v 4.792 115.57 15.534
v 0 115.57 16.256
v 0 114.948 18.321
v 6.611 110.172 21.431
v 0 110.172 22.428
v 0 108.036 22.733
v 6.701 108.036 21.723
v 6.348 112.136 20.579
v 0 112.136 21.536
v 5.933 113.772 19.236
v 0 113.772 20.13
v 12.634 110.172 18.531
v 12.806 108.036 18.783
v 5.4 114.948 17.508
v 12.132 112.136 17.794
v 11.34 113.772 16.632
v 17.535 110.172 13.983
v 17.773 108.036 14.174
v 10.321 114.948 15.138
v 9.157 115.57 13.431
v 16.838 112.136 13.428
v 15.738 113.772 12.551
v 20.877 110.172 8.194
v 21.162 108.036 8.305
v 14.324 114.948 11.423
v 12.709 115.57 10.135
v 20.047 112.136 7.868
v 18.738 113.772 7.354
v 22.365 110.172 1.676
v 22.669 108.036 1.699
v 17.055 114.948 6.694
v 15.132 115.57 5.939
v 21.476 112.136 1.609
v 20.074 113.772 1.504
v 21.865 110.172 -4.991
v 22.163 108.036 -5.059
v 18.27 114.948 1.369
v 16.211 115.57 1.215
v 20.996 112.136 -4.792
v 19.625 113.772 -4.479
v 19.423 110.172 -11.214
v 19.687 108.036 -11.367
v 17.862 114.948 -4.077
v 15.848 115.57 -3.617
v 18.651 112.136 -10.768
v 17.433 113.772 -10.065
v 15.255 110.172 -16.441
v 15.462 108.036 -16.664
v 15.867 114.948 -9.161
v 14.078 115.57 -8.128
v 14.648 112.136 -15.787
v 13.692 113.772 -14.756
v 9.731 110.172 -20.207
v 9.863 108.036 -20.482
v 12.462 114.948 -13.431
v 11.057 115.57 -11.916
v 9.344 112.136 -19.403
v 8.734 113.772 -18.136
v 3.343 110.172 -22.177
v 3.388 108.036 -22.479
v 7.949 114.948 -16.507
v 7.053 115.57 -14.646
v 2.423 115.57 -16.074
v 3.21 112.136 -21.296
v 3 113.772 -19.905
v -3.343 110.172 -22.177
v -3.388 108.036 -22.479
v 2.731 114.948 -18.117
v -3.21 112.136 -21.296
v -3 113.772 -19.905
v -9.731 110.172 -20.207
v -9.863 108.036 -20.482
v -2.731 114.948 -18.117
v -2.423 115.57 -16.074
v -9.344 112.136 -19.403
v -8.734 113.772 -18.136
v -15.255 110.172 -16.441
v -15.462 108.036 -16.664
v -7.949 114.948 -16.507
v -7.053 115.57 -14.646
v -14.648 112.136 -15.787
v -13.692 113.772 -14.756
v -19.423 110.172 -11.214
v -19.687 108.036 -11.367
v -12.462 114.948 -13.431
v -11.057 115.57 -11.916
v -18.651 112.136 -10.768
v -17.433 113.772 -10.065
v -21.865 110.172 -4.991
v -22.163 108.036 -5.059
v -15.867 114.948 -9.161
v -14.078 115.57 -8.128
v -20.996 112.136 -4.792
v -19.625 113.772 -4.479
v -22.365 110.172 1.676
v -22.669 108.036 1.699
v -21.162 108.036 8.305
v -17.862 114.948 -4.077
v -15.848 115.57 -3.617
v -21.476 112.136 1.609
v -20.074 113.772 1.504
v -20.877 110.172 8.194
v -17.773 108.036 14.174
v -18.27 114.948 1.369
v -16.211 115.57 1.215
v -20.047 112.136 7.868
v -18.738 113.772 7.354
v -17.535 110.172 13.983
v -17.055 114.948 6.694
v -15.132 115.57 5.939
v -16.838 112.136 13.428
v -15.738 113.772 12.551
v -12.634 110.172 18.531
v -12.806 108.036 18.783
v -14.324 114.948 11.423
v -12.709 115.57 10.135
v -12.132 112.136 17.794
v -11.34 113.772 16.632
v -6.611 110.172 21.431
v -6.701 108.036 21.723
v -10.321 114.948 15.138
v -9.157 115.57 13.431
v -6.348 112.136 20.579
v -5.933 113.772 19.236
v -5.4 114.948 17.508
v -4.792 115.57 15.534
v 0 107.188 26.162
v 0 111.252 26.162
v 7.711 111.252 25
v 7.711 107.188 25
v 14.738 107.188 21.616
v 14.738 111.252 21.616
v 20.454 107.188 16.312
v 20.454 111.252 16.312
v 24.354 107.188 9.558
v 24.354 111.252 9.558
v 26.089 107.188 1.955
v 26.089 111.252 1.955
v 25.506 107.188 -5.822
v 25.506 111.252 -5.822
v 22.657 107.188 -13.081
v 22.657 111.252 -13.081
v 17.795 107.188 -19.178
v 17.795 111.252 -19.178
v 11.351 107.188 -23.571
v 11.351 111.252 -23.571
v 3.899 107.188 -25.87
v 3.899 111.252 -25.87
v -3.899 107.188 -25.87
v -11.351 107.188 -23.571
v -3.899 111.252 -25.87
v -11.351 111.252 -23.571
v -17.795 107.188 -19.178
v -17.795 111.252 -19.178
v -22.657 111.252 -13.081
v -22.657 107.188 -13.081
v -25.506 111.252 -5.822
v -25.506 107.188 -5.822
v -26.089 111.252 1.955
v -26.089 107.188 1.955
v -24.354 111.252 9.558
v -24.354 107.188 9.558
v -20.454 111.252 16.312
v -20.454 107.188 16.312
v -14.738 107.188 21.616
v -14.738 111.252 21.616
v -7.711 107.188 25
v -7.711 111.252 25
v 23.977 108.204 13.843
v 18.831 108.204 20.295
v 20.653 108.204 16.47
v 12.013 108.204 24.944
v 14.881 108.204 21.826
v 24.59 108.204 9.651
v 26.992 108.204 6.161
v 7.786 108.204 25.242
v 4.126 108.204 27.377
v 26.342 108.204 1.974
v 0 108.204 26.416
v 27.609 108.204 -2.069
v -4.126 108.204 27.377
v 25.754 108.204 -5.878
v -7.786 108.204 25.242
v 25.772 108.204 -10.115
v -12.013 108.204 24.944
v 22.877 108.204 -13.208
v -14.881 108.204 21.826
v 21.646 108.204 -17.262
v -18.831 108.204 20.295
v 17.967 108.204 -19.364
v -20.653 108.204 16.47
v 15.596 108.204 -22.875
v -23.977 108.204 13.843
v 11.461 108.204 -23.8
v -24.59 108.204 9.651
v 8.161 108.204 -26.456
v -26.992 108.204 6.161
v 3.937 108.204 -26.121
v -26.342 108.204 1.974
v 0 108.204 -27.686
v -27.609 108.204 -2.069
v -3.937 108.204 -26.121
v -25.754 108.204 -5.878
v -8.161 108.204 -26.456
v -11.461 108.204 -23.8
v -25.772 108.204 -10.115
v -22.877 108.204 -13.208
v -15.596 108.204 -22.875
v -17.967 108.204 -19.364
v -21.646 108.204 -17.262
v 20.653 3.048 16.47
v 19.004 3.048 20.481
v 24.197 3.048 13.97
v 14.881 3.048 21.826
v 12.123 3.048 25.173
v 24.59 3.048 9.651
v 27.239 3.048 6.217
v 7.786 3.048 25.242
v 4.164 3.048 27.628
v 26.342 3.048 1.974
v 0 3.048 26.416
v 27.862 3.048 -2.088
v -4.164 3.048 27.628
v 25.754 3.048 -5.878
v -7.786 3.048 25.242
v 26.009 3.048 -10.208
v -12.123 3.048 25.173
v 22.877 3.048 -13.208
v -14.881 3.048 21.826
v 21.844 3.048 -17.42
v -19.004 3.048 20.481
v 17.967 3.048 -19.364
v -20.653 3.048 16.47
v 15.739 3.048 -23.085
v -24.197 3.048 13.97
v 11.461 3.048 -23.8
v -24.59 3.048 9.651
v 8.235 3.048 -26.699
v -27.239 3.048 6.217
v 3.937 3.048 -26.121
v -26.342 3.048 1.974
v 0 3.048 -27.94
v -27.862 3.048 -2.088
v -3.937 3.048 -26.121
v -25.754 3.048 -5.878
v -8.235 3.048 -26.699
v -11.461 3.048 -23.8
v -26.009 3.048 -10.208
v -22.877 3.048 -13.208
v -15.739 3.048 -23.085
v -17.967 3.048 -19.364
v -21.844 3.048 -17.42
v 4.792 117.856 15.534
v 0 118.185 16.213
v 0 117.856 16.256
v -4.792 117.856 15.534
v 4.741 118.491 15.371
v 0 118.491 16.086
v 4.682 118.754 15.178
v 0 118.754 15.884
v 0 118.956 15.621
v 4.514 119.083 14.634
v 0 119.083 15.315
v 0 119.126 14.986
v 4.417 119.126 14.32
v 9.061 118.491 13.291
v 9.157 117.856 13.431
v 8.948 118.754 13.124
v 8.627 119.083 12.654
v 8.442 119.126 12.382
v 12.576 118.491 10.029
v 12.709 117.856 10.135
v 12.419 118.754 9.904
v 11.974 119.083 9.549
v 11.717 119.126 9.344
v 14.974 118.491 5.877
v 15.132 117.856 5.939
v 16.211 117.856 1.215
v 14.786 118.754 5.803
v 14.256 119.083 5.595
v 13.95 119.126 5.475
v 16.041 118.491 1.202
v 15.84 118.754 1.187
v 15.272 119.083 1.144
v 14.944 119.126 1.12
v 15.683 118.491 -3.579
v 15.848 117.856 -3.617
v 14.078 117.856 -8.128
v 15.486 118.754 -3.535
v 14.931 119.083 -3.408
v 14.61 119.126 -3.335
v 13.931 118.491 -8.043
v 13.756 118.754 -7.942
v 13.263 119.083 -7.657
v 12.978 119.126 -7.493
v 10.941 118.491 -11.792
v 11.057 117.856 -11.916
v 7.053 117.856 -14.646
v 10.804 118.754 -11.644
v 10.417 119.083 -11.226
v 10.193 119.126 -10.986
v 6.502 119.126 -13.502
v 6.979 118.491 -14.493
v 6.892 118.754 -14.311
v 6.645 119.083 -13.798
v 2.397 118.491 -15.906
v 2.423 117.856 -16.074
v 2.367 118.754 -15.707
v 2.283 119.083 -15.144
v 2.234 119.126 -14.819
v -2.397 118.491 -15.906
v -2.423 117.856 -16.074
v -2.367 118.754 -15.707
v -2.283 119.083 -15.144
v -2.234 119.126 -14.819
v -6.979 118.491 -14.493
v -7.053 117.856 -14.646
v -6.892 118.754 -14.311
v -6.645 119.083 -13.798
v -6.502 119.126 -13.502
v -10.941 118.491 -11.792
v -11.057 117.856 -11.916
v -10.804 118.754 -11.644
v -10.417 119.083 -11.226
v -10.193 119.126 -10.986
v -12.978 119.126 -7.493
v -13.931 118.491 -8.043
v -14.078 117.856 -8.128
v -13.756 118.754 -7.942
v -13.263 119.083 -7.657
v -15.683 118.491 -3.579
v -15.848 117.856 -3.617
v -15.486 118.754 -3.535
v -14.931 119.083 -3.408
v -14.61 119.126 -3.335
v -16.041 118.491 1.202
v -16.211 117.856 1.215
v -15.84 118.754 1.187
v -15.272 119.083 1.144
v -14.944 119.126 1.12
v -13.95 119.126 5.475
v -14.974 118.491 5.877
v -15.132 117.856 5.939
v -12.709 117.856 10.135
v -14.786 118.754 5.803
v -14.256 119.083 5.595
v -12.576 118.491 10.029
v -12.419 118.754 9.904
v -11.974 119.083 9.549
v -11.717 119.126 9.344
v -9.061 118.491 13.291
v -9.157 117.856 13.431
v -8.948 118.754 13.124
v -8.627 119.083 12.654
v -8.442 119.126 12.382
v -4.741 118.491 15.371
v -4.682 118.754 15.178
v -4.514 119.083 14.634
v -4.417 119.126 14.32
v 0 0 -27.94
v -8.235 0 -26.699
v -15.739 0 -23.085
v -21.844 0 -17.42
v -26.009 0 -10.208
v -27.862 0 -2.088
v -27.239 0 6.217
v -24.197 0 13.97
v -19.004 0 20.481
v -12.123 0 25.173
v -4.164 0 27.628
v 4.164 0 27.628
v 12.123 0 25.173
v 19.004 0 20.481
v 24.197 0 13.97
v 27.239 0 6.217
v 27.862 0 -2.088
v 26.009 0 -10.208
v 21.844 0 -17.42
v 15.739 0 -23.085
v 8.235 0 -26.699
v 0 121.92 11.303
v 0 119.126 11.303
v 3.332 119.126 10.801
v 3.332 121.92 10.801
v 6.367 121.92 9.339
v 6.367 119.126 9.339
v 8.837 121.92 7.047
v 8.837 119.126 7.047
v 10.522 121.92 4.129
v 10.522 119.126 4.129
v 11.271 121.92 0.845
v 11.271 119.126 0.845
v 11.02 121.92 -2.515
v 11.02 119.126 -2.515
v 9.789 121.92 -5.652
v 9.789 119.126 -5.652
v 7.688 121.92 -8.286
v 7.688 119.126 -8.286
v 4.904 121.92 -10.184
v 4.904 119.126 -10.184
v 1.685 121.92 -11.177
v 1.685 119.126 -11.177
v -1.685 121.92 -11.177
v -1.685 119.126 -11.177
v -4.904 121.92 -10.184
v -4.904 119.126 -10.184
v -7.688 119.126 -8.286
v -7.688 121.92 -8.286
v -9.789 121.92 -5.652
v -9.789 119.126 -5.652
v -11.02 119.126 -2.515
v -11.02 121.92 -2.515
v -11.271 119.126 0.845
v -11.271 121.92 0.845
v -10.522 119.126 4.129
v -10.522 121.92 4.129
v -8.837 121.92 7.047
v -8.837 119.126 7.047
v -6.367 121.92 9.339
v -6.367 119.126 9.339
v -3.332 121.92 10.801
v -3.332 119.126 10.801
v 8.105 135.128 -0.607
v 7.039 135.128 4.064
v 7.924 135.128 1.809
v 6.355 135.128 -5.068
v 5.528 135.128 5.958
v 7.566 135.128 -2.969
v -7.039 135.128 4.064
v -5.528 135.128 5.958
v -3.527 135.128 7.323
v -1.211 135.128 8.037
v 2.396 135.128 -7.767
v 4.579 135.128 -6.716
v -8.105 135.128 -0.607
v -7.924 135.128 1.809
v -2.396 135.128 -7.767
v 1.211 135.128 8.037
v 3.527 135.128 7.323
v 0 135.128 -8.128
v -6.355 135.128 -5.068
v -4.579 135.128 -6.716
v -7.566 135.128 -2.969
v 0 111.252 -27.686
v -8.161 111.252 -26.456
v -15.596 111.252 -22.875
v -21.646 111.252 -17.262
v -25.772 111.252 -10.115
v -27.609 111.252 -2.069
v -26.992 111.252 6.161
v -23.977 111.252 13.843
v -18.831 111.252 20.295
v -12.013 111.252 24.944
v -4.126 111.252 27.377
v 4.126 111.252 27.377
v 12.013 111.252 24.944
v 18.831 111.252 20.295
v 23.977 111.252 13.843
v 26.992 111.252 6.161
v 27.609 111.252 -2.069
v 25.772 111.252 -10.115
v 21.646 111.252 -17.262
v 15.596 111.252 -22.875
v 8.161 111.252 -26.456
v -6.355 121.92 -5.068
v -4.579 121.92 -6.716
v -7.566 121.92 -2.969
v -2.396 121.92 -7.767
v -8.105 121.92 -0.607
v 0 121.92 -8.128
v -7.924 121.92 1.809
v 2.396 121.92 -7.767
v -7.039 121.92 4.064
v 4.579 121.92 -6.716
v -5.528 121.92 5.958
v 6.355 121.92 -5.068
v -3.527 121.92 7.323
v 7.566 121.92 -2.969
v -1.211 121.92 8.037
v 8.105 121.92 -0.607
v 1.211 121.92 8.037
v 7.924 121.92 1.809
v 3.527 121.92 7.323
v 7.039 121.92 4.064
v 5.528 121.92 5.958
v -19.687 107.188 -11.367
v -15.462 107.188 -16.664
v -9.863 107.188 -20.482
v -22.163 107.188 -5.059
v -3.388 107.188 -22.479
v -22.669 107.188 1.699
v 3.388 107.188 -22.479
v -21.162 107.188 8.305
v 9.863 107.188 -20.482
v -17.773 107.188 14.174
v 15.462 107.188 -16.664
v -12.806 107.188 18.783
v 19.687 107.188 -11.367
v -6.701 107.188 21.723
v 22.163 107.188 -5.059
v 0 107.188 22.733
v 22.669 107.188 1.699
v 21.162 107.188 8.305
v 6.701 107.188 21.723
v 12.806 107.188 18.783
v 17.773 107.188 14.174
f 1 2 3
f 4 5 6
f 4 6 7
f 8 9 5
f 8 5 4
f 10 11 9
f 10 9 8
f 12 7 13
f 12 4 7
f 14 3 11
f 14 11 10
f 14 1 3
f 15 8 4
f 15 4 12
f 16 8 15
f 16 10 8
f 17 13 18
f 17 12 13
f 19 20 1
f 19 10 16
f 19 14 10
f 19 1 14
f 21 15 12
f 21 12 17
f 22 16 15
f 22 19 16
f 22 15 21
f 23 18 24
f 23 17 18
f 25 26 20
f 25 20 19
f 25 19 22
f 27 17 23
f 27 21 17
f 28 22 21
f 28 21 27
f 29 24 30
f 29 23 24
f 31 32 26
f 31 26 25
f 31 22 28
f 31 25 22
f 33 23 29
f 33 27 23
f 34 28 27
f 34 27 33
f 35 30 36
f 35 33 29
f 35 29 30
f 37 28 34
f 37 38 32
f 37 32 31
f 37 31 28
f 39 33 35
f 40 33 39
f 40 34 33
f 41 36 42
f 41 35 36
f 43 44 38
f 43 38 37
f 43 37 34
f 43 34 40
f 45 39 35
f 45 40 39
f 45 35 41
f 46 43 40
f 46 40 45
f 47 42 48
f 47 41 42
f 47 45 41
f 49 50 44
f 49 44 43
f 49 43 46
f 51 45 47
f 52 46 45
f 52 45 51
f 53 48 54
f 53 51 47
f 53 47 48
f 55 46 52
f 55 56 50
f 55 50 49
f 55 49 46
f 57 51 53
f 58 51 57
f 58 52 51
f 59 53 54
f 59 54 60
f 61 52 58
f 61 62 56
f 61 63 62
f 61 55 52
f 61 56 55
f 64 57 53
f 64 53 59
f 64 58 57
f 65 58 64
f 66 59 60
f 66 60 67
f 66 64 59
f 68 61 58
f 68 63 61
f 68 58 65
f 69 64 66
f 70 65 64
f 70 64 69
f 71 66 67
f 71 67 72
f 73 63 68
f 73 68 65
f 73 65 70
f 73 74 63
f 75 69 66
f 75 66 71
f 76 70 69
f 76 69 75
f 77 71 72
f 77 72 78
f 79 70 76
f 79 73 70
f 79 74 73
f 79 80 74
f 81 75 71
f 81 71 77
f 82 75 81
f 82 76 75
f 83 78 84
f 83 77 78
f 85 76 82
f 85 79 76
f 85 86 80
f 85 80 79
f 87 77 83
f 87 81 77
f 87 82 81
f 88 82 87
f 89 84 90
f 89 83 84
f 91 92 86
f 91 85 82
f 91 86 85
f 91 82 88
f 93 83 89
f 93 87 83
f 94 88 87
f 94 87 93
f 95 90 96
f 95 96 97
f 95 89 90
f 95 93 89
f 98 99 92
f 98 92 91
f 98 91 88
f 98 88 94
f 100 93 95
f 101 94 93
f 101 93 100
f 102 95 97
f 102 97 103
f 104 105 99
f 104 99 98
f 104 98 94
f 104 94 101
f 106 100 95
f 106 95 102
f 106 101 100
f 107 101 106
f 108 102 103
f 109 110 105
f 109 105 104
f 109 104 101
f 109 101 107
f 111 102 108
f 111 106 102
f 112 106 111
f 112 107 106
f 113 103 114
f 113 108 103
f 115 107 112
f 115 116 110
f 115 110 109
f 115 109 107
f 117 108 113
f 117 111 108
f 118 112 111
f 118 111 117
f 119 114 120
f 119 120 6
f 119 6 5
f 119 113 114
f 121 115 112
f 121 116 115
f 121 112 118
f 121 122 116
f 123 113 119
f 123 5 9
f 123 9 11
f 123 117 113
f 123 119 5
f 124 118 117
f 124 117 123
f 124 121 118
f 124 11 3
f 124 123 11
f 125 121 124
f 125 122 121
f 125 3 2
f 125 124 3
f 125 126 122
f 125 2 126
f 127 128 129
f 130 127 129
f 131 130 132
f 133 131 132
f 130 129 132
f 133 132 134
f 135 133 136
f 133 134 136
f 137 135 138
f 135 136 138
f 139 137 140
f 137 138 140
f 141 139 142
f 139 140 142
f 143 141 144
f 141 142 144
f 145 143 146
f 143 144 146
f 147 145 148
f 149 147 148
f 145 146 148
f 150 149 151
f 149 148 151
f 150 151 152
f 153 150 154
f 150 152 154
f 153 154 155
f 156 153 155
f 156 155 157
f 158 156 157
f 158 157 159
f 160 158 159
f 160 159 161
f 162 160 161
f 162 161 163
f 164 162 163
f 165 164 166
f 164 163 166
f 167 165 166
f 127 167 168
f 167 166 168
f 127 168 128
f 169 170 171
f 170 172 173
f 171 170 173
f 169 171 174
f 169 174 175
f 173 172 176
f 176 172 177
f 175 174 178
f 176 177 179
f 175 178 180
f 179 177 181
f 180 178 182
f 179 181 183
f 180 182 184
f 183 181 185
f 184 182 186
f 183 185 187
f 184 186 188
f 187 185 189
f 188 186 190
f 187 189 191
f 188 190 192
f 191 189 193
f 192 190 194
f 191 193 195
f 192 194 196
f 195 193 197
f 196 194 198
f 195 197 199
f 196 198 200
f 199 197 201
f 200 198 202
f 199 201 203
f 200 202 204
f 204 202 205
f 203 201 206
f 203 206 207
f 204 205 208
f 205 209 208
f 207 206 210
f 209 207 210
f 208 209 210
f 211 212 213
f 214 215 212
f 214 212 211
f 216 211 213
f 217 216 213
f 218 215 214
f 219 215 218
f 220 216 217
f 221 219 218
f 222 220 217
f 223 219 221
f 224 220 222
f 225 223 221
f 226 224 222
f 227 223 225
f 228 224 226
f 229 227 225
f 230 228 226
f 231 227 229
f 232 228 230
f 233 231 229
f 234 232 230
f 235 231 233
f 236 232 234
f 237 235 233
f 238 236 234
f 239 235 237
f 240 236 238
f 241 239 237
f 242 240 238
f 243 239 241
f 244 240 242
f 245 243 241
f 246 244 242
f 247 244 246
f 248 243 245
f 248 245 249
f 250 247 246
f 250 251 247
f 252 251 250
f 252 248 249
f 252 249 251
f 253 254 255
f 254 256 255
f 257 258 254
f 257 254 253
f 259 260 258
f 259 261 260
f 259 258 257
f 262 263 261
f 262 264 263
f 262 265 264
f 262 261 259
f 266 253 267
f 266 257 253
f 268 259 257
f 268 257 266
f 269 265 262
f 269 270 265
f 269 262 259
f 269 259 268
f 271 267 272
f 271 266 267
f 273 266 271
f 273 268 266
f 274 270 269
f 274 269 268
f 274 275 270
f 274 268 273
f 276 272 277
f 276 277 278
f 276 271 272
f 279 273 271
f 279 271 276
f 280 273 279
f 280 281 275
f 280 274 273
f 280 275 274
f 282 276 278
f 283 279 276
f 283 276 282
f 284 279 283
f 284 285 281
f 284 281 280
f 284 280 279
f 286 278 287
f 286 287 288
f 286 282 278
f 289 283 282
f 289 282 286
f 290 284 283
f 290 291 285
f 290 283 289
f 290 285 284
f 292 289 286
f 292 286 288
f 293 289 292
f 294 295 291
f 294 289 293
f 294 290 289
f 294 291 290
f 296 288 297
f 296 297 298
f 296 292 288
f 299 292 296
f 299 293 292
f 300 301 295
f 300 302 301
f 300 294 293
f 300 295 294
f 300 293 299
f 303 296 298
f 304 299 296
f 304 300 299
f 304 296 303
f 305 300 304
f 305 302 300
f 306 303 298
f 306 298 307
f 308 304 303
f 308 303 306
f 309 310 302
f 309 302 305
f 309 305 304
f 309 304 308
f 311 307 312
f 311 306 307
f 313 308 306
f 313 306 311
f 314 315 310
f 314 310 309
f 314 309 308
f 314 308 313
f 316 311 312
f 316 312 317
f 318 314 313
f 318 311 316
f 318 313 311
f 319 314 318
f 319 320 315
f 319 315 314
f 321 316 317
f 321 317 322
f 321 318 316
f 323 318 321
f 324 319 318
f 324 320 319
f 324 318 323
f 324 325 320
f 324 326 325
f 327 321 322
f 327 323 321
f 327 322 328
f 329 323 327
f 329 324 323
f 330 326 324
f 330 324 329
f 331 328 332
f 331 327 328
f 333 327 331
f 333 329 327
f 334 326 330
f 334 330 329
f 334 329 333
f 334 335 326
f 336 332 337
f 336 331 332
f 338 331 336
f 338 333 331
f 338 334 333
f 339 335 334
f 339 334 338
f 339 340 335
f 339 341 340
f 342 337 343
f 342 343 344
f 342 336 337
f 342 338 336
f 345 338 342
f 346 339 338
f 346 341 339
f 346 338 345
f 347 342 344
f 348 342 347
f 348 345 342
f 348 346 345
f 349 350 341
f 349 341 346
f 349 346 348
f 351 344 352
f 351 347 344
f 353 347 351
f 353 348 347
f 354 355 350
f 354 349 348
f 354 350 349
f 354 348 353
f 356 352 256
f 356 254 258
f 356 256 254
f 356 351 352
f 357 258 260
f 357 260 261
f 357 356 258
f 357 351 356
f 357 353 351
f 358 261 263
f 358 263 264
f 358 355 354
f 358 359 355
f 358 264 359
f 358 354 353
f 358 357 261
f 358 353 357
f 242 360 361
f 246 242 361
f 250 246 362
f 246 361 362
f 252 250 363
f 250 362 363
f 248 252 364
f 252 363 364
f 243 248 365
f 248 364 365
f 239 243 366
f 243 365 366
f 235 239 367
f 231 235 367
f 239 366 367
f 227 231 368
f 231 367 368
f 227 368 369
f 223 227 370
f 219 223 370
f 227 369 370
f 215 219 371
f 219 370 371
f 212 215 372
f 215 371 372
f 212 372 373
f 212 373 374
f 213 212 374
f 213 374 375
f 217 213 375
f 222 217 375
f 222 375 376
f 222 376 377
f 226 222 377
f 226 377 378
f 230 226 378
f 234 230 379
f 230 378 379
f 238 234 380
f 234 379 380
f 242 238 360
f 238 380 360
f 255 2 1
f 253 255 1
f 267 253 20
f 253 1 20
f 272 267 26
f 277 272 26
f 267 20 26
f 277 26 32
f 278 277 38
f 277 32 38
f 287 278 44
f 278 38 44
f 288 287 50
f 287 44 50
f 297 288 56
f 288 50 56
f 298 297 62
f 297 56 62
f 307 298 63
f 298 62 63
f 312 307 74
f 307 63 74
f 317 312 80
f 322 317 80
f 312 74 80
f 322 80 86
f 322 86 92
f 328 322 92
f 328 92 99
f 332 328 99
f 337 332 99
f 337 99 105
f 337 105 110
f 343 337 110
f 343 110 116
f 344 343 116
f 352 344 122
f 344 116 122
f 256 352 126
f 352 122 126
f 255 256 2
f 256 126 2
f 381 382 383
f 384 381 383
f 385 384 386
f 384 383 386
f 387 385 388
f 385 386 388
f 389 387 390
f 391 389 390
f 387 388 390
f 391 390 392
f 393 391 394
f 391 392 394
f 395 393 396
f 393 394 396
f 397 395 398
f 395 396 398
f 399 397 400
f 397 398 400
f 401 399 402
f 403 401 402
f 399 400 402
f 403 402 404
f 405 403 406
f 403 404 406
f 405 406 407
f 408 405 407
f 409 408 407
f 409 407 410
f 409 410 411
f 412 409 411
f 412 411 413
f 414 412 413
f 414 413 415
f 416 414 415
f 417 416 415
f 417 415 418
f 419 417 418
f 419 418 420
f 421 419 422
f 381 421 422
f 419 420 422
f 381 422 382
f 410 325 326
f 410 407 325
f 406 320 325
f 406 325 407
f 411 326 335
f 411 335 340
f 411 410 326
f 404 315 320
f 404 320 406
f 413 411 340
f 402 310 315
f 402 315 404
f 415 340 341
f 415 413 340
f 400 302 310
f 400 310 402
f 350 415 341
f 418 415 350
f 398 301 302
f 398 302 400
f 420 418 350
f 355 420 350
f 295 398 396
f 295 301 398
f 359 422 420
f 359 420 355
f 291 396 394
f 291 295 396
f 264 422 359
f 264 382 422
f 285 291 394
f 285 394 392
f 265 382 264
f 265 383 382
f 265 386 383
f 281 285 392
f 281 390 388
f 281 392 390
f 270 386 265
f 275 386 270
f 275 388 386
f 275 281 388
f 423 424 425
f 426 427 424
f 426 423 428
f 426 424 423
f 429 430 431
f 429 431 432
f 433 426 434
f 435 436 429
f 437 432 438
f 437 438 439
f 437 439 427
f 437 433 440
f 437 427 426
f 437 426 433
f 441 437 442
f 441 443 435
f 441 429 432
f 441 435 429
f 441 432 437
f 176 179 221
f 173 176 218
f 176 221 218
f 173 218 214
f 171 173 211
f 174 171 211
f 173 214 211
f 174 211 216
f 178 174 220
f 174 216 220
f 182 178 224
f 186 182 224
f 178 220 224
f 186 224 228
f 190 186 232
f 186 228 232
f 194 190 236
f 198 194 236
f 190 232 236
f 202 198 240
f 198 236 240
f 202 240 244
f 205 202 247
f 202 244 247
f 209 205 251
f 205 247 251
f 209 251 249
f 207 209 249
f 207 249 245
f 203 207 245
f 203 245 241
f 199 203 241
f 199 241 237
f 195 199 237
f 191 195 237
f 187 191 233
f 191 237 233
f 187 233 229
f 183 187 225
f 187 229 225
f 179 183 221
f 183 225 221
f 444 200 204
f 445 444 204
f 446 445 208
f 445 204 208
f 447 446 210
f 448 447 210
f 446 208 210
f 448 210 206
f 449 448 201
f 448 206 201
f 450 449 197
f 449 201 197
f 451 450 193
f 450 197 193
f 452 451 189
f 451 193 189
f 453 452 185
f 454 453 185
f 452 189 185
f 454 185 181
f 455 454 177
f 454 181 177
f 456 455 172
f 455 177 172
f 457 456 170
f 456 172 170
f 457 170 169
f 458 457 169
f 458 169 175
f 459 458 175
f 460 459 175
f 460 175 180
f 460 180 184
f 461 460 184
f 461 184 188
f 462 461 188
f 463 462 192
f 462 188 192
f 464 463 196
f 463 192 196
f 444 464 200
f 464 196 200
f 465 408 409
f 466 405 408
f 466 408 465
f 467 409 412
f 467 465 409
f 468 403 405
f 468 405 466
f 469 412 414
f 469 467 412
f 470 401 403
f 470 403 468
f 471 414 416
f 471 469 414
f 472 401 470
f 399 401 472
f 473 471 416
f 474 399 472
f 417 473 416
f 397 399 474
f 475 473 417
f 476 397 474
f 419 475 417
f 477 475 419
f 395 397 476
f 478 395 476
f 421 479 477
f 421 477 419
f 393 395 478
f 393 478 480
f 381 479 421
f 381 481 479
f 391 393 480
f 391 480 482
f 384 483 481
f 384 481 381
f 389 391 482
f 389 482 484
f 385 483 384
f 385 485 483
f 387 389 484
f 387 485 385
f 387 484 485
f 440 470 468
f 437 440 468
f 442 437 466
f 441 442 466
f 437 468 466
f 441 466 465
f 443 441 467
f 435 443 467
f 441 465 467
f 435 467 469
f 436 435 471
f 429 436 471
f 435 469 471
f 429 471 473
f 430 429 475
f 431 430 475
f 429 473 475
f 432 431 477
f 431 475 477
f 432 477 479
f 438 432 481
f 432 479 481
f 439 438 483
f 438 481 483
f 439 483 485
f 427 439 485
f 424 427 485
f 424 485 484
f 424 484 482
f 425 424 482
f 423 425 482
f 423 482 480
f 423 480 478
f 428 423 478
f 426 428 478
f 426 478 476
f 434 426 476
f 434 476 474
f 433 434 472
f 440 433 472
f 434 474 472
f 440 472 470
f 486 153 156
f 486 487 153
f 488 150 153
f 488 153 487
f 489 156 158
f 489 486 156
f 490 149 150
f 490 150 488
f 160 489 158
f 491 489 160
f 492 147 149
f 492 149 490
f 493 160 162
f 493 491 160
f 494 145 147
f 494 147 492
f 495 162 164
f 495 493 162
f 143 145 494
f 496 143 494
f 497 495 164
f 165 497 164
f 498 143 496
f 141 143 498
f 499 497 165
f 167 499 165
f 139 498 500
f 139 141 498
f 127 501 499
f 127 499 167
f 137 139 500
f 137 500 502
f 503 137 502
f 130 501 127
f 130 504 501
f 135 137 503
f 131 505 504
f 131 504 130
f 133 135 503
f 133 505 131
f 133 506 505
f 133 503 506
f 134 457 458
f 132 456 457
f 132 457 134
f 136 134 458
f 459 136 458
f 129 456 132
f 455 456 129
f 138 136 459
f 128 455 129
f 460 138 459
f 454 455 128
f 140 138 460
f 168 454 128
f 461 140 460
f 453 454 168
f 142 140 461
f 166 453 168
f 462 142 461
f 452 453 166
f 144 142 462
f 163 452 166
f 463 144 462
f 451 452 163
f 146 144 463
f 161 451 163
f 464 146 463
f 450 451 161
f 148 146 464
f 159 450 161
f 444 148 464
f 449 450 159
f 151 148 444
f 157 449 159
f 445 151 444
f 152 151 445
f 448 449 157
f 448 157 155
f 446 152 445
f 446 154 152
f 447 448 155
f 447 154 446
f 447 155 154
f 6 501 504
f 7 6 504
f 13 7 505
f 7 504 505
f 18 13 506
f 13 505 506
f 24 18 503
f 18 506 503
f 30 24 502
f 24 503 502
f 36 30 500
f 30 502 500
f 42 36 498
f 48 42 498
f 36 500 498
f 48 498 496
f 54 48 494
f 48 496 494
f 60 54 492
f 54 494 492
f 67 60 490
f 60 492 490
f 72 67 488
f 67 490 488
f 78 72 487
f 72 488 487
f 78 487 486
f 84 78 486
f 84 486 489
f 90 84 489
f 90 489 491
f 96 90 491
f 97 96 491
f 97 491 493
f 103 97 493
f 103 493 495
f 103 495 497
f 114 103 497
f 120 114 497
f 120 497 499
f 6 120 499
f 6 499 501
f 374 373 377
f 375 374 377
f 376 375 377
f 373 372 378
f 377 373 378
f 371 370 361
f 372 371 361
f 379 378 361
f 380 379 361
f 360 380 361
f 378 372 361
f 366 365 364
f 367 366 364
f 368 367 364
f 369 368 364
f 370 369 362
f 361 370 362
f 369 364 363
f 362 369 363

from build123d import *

# Parameters (mm, degrees)
SKETCH1_R           = 27.94
BOSS_EXTRUDE1_DEPTH = 3.048
SKETCH2_R           = 26.416
BOSS_EXTRUDE2_DEPTH = 105.156
SKETCH3_R           = 27.686
BOSS_EXTRUDE3_DEPTH = 3.048
SKETCH4_R           = 26.162
CUT_EXTRUDE1_DEPTH  = 4.064
SKETCH5_R           = 22.733
BOSS_EXTRUDE4_DEPTH = 8.382
SKETCH6_R           = 16.256
BOSS_EXTRUDE5_DEPTH = 3.556
SKETCH7_R           = 11.303
BOSS_EXTRUDE6_DEPTH = 2.794
SKETCH8_R           = 8.128
BOSS_EXTRUDE7_DEPTH = 13.208
FILLET1_R           = 7.62
FILLET2_R           = 1.27


with BuildPart() as part:
    # Sketch1 → Boss-Extrude1 (new body)
    with BuildSketch(Plane(origin=(0, 0, 0), x_dir=(1, 0, 0), z_dir=(0, 1, 0))):
        with Locations(Location((0, 0, 0), (0, 0, 90))):
            Circle(SKETCH1_R)
    extrude(amount=BOSS_EXTRUDE1_DEPTH)

    # Sketch2 → Boss-Extrude2 (add)
    with BuildSketch(Plane(origin=(0, 3.048, 0), x_dir=(1, 0, 0), z_dir=(0, 1, 0))):
        with Locations(Location((0, 0, 0), (0, 0, 270))):
            Circle(SKETCH2_R)
    extrude(amount=BOSS_EXTRUDE2_DEPTH)

    # Sketch3 → Boss-Extrude3 (add)
    with BuildSketch(Plane(origin=(0, 108.204, 0), x_dir=(1, 0, 0), z_dir=(0, 1, 0))):
        with Locations(Location((0, 0, 0), (0, 0, 90))):
            Circle(SKETCH3_R)
    extrude(amount=BOSS_EXTRUDE3_DEPTH)

    # Sketch4 → Cut-Extrude1 (cut)
    with BuildSketch(Plane(origin=(0, 111.252, 0), x_dir=(1, 0, 0), z_dir=(0, 1, 0))):
        with Locations(Location((0, 0, 0), (0, 0, 270))):
            Circle(SKETCH4_R)
    extrude(amount=-CUT_EXTRUDE1_DEPTH, mode=Mode.SUBTRACT)

    # Sketch5 → Boss-Extrude4 (add)
    with BuildSketch(Plane(origin=(0, 107.188, 0), x_dir=(1, 0, 0), z_dir=(0, 1, 0))):
        with Locations(Location((0, 0, 0), (0, 0, 270))):
            Circle(SKETCH5_R)
    extrude(amount=BOSS_EXTRUDE4_DEPTH)

    # Sketch6 → Boss-Extrude5 (add)
    with BuildSketch(Plane(origin=(0, 115.57, 0), x_dir=(1, 0, 0), z_dir=(0, 1, 0))):
        with Locations(Location((0, 0, 0), (0, 0, 270))):
            Circle(SKETCH6_R)
    extrude(amount=BOSS_EXTRUDE5_DEPTH)

    # Sketch7 → Boss-Extrude6 (add)
    with BuildSketch(Plane(origin=(0, 119.126, 0), x_dir=(1, 0, 0), z_dir=(0, 1, 0))):
        with Locations(Location((0, 0, 0), (0, 0, 270))):
            Circle(SKETCH7_R)
    extrude(amount=BOSS_EXTRUDE6_DEPTH)

    # Sketch8 → Boss-Extrude7 (add)
    with BuildSketch(Plane(origin=(0, 121.92, 0), x_dir=(1, 0, 0), z_dir=(0, 1, 0))):
        with Locations(Location((0, 0, 0), (0, 0, 90))):
            Circle(SKETCH8_R)
    extrude(amount=BOSS_EXTRUDE7_DEPTH)

    # Fillet1
    # the kernel refuses this fillet: 7.62 mm, written as the material it takes off along each edge
    with BuildSketch(Plane(origin=(0, 115.57, 0), x_dir=(0, 0, 1), z_dir=(-1, 0, 0))) as fillet1_piece_1:
        with BuildLine():
            CenterArc((15.113, -7.533787295), FILLET1_R, 0, 81.373073441)
            Line((16.256, 0), (16.27886, 0.150675746))
            ThreePointArc((16.27886, 0.150675746), (19.4945, 0.1524), (22.733, 0.1524))
            Line((22.733, 0.1524), (22.8854, 0))
            Line((22.8854, 0), (22.8854, -7.533787295))
            Line((22.8854, -7.533787295), (22.733, -7.533787295))
        make_face()
    revolve(axis=Axis((0, 115.57, 0), (0, 1, 0)), mode=Mode.SUBTRACT)

    # Fillet2
    fillet2_edges = [part.edges().sort_by_distance(p)[0] for p in [
        (0, 119.126, -16.256),
    ]]
    fillet(fillet2_edges, radius=FILLET2_R)


solid = part.part
